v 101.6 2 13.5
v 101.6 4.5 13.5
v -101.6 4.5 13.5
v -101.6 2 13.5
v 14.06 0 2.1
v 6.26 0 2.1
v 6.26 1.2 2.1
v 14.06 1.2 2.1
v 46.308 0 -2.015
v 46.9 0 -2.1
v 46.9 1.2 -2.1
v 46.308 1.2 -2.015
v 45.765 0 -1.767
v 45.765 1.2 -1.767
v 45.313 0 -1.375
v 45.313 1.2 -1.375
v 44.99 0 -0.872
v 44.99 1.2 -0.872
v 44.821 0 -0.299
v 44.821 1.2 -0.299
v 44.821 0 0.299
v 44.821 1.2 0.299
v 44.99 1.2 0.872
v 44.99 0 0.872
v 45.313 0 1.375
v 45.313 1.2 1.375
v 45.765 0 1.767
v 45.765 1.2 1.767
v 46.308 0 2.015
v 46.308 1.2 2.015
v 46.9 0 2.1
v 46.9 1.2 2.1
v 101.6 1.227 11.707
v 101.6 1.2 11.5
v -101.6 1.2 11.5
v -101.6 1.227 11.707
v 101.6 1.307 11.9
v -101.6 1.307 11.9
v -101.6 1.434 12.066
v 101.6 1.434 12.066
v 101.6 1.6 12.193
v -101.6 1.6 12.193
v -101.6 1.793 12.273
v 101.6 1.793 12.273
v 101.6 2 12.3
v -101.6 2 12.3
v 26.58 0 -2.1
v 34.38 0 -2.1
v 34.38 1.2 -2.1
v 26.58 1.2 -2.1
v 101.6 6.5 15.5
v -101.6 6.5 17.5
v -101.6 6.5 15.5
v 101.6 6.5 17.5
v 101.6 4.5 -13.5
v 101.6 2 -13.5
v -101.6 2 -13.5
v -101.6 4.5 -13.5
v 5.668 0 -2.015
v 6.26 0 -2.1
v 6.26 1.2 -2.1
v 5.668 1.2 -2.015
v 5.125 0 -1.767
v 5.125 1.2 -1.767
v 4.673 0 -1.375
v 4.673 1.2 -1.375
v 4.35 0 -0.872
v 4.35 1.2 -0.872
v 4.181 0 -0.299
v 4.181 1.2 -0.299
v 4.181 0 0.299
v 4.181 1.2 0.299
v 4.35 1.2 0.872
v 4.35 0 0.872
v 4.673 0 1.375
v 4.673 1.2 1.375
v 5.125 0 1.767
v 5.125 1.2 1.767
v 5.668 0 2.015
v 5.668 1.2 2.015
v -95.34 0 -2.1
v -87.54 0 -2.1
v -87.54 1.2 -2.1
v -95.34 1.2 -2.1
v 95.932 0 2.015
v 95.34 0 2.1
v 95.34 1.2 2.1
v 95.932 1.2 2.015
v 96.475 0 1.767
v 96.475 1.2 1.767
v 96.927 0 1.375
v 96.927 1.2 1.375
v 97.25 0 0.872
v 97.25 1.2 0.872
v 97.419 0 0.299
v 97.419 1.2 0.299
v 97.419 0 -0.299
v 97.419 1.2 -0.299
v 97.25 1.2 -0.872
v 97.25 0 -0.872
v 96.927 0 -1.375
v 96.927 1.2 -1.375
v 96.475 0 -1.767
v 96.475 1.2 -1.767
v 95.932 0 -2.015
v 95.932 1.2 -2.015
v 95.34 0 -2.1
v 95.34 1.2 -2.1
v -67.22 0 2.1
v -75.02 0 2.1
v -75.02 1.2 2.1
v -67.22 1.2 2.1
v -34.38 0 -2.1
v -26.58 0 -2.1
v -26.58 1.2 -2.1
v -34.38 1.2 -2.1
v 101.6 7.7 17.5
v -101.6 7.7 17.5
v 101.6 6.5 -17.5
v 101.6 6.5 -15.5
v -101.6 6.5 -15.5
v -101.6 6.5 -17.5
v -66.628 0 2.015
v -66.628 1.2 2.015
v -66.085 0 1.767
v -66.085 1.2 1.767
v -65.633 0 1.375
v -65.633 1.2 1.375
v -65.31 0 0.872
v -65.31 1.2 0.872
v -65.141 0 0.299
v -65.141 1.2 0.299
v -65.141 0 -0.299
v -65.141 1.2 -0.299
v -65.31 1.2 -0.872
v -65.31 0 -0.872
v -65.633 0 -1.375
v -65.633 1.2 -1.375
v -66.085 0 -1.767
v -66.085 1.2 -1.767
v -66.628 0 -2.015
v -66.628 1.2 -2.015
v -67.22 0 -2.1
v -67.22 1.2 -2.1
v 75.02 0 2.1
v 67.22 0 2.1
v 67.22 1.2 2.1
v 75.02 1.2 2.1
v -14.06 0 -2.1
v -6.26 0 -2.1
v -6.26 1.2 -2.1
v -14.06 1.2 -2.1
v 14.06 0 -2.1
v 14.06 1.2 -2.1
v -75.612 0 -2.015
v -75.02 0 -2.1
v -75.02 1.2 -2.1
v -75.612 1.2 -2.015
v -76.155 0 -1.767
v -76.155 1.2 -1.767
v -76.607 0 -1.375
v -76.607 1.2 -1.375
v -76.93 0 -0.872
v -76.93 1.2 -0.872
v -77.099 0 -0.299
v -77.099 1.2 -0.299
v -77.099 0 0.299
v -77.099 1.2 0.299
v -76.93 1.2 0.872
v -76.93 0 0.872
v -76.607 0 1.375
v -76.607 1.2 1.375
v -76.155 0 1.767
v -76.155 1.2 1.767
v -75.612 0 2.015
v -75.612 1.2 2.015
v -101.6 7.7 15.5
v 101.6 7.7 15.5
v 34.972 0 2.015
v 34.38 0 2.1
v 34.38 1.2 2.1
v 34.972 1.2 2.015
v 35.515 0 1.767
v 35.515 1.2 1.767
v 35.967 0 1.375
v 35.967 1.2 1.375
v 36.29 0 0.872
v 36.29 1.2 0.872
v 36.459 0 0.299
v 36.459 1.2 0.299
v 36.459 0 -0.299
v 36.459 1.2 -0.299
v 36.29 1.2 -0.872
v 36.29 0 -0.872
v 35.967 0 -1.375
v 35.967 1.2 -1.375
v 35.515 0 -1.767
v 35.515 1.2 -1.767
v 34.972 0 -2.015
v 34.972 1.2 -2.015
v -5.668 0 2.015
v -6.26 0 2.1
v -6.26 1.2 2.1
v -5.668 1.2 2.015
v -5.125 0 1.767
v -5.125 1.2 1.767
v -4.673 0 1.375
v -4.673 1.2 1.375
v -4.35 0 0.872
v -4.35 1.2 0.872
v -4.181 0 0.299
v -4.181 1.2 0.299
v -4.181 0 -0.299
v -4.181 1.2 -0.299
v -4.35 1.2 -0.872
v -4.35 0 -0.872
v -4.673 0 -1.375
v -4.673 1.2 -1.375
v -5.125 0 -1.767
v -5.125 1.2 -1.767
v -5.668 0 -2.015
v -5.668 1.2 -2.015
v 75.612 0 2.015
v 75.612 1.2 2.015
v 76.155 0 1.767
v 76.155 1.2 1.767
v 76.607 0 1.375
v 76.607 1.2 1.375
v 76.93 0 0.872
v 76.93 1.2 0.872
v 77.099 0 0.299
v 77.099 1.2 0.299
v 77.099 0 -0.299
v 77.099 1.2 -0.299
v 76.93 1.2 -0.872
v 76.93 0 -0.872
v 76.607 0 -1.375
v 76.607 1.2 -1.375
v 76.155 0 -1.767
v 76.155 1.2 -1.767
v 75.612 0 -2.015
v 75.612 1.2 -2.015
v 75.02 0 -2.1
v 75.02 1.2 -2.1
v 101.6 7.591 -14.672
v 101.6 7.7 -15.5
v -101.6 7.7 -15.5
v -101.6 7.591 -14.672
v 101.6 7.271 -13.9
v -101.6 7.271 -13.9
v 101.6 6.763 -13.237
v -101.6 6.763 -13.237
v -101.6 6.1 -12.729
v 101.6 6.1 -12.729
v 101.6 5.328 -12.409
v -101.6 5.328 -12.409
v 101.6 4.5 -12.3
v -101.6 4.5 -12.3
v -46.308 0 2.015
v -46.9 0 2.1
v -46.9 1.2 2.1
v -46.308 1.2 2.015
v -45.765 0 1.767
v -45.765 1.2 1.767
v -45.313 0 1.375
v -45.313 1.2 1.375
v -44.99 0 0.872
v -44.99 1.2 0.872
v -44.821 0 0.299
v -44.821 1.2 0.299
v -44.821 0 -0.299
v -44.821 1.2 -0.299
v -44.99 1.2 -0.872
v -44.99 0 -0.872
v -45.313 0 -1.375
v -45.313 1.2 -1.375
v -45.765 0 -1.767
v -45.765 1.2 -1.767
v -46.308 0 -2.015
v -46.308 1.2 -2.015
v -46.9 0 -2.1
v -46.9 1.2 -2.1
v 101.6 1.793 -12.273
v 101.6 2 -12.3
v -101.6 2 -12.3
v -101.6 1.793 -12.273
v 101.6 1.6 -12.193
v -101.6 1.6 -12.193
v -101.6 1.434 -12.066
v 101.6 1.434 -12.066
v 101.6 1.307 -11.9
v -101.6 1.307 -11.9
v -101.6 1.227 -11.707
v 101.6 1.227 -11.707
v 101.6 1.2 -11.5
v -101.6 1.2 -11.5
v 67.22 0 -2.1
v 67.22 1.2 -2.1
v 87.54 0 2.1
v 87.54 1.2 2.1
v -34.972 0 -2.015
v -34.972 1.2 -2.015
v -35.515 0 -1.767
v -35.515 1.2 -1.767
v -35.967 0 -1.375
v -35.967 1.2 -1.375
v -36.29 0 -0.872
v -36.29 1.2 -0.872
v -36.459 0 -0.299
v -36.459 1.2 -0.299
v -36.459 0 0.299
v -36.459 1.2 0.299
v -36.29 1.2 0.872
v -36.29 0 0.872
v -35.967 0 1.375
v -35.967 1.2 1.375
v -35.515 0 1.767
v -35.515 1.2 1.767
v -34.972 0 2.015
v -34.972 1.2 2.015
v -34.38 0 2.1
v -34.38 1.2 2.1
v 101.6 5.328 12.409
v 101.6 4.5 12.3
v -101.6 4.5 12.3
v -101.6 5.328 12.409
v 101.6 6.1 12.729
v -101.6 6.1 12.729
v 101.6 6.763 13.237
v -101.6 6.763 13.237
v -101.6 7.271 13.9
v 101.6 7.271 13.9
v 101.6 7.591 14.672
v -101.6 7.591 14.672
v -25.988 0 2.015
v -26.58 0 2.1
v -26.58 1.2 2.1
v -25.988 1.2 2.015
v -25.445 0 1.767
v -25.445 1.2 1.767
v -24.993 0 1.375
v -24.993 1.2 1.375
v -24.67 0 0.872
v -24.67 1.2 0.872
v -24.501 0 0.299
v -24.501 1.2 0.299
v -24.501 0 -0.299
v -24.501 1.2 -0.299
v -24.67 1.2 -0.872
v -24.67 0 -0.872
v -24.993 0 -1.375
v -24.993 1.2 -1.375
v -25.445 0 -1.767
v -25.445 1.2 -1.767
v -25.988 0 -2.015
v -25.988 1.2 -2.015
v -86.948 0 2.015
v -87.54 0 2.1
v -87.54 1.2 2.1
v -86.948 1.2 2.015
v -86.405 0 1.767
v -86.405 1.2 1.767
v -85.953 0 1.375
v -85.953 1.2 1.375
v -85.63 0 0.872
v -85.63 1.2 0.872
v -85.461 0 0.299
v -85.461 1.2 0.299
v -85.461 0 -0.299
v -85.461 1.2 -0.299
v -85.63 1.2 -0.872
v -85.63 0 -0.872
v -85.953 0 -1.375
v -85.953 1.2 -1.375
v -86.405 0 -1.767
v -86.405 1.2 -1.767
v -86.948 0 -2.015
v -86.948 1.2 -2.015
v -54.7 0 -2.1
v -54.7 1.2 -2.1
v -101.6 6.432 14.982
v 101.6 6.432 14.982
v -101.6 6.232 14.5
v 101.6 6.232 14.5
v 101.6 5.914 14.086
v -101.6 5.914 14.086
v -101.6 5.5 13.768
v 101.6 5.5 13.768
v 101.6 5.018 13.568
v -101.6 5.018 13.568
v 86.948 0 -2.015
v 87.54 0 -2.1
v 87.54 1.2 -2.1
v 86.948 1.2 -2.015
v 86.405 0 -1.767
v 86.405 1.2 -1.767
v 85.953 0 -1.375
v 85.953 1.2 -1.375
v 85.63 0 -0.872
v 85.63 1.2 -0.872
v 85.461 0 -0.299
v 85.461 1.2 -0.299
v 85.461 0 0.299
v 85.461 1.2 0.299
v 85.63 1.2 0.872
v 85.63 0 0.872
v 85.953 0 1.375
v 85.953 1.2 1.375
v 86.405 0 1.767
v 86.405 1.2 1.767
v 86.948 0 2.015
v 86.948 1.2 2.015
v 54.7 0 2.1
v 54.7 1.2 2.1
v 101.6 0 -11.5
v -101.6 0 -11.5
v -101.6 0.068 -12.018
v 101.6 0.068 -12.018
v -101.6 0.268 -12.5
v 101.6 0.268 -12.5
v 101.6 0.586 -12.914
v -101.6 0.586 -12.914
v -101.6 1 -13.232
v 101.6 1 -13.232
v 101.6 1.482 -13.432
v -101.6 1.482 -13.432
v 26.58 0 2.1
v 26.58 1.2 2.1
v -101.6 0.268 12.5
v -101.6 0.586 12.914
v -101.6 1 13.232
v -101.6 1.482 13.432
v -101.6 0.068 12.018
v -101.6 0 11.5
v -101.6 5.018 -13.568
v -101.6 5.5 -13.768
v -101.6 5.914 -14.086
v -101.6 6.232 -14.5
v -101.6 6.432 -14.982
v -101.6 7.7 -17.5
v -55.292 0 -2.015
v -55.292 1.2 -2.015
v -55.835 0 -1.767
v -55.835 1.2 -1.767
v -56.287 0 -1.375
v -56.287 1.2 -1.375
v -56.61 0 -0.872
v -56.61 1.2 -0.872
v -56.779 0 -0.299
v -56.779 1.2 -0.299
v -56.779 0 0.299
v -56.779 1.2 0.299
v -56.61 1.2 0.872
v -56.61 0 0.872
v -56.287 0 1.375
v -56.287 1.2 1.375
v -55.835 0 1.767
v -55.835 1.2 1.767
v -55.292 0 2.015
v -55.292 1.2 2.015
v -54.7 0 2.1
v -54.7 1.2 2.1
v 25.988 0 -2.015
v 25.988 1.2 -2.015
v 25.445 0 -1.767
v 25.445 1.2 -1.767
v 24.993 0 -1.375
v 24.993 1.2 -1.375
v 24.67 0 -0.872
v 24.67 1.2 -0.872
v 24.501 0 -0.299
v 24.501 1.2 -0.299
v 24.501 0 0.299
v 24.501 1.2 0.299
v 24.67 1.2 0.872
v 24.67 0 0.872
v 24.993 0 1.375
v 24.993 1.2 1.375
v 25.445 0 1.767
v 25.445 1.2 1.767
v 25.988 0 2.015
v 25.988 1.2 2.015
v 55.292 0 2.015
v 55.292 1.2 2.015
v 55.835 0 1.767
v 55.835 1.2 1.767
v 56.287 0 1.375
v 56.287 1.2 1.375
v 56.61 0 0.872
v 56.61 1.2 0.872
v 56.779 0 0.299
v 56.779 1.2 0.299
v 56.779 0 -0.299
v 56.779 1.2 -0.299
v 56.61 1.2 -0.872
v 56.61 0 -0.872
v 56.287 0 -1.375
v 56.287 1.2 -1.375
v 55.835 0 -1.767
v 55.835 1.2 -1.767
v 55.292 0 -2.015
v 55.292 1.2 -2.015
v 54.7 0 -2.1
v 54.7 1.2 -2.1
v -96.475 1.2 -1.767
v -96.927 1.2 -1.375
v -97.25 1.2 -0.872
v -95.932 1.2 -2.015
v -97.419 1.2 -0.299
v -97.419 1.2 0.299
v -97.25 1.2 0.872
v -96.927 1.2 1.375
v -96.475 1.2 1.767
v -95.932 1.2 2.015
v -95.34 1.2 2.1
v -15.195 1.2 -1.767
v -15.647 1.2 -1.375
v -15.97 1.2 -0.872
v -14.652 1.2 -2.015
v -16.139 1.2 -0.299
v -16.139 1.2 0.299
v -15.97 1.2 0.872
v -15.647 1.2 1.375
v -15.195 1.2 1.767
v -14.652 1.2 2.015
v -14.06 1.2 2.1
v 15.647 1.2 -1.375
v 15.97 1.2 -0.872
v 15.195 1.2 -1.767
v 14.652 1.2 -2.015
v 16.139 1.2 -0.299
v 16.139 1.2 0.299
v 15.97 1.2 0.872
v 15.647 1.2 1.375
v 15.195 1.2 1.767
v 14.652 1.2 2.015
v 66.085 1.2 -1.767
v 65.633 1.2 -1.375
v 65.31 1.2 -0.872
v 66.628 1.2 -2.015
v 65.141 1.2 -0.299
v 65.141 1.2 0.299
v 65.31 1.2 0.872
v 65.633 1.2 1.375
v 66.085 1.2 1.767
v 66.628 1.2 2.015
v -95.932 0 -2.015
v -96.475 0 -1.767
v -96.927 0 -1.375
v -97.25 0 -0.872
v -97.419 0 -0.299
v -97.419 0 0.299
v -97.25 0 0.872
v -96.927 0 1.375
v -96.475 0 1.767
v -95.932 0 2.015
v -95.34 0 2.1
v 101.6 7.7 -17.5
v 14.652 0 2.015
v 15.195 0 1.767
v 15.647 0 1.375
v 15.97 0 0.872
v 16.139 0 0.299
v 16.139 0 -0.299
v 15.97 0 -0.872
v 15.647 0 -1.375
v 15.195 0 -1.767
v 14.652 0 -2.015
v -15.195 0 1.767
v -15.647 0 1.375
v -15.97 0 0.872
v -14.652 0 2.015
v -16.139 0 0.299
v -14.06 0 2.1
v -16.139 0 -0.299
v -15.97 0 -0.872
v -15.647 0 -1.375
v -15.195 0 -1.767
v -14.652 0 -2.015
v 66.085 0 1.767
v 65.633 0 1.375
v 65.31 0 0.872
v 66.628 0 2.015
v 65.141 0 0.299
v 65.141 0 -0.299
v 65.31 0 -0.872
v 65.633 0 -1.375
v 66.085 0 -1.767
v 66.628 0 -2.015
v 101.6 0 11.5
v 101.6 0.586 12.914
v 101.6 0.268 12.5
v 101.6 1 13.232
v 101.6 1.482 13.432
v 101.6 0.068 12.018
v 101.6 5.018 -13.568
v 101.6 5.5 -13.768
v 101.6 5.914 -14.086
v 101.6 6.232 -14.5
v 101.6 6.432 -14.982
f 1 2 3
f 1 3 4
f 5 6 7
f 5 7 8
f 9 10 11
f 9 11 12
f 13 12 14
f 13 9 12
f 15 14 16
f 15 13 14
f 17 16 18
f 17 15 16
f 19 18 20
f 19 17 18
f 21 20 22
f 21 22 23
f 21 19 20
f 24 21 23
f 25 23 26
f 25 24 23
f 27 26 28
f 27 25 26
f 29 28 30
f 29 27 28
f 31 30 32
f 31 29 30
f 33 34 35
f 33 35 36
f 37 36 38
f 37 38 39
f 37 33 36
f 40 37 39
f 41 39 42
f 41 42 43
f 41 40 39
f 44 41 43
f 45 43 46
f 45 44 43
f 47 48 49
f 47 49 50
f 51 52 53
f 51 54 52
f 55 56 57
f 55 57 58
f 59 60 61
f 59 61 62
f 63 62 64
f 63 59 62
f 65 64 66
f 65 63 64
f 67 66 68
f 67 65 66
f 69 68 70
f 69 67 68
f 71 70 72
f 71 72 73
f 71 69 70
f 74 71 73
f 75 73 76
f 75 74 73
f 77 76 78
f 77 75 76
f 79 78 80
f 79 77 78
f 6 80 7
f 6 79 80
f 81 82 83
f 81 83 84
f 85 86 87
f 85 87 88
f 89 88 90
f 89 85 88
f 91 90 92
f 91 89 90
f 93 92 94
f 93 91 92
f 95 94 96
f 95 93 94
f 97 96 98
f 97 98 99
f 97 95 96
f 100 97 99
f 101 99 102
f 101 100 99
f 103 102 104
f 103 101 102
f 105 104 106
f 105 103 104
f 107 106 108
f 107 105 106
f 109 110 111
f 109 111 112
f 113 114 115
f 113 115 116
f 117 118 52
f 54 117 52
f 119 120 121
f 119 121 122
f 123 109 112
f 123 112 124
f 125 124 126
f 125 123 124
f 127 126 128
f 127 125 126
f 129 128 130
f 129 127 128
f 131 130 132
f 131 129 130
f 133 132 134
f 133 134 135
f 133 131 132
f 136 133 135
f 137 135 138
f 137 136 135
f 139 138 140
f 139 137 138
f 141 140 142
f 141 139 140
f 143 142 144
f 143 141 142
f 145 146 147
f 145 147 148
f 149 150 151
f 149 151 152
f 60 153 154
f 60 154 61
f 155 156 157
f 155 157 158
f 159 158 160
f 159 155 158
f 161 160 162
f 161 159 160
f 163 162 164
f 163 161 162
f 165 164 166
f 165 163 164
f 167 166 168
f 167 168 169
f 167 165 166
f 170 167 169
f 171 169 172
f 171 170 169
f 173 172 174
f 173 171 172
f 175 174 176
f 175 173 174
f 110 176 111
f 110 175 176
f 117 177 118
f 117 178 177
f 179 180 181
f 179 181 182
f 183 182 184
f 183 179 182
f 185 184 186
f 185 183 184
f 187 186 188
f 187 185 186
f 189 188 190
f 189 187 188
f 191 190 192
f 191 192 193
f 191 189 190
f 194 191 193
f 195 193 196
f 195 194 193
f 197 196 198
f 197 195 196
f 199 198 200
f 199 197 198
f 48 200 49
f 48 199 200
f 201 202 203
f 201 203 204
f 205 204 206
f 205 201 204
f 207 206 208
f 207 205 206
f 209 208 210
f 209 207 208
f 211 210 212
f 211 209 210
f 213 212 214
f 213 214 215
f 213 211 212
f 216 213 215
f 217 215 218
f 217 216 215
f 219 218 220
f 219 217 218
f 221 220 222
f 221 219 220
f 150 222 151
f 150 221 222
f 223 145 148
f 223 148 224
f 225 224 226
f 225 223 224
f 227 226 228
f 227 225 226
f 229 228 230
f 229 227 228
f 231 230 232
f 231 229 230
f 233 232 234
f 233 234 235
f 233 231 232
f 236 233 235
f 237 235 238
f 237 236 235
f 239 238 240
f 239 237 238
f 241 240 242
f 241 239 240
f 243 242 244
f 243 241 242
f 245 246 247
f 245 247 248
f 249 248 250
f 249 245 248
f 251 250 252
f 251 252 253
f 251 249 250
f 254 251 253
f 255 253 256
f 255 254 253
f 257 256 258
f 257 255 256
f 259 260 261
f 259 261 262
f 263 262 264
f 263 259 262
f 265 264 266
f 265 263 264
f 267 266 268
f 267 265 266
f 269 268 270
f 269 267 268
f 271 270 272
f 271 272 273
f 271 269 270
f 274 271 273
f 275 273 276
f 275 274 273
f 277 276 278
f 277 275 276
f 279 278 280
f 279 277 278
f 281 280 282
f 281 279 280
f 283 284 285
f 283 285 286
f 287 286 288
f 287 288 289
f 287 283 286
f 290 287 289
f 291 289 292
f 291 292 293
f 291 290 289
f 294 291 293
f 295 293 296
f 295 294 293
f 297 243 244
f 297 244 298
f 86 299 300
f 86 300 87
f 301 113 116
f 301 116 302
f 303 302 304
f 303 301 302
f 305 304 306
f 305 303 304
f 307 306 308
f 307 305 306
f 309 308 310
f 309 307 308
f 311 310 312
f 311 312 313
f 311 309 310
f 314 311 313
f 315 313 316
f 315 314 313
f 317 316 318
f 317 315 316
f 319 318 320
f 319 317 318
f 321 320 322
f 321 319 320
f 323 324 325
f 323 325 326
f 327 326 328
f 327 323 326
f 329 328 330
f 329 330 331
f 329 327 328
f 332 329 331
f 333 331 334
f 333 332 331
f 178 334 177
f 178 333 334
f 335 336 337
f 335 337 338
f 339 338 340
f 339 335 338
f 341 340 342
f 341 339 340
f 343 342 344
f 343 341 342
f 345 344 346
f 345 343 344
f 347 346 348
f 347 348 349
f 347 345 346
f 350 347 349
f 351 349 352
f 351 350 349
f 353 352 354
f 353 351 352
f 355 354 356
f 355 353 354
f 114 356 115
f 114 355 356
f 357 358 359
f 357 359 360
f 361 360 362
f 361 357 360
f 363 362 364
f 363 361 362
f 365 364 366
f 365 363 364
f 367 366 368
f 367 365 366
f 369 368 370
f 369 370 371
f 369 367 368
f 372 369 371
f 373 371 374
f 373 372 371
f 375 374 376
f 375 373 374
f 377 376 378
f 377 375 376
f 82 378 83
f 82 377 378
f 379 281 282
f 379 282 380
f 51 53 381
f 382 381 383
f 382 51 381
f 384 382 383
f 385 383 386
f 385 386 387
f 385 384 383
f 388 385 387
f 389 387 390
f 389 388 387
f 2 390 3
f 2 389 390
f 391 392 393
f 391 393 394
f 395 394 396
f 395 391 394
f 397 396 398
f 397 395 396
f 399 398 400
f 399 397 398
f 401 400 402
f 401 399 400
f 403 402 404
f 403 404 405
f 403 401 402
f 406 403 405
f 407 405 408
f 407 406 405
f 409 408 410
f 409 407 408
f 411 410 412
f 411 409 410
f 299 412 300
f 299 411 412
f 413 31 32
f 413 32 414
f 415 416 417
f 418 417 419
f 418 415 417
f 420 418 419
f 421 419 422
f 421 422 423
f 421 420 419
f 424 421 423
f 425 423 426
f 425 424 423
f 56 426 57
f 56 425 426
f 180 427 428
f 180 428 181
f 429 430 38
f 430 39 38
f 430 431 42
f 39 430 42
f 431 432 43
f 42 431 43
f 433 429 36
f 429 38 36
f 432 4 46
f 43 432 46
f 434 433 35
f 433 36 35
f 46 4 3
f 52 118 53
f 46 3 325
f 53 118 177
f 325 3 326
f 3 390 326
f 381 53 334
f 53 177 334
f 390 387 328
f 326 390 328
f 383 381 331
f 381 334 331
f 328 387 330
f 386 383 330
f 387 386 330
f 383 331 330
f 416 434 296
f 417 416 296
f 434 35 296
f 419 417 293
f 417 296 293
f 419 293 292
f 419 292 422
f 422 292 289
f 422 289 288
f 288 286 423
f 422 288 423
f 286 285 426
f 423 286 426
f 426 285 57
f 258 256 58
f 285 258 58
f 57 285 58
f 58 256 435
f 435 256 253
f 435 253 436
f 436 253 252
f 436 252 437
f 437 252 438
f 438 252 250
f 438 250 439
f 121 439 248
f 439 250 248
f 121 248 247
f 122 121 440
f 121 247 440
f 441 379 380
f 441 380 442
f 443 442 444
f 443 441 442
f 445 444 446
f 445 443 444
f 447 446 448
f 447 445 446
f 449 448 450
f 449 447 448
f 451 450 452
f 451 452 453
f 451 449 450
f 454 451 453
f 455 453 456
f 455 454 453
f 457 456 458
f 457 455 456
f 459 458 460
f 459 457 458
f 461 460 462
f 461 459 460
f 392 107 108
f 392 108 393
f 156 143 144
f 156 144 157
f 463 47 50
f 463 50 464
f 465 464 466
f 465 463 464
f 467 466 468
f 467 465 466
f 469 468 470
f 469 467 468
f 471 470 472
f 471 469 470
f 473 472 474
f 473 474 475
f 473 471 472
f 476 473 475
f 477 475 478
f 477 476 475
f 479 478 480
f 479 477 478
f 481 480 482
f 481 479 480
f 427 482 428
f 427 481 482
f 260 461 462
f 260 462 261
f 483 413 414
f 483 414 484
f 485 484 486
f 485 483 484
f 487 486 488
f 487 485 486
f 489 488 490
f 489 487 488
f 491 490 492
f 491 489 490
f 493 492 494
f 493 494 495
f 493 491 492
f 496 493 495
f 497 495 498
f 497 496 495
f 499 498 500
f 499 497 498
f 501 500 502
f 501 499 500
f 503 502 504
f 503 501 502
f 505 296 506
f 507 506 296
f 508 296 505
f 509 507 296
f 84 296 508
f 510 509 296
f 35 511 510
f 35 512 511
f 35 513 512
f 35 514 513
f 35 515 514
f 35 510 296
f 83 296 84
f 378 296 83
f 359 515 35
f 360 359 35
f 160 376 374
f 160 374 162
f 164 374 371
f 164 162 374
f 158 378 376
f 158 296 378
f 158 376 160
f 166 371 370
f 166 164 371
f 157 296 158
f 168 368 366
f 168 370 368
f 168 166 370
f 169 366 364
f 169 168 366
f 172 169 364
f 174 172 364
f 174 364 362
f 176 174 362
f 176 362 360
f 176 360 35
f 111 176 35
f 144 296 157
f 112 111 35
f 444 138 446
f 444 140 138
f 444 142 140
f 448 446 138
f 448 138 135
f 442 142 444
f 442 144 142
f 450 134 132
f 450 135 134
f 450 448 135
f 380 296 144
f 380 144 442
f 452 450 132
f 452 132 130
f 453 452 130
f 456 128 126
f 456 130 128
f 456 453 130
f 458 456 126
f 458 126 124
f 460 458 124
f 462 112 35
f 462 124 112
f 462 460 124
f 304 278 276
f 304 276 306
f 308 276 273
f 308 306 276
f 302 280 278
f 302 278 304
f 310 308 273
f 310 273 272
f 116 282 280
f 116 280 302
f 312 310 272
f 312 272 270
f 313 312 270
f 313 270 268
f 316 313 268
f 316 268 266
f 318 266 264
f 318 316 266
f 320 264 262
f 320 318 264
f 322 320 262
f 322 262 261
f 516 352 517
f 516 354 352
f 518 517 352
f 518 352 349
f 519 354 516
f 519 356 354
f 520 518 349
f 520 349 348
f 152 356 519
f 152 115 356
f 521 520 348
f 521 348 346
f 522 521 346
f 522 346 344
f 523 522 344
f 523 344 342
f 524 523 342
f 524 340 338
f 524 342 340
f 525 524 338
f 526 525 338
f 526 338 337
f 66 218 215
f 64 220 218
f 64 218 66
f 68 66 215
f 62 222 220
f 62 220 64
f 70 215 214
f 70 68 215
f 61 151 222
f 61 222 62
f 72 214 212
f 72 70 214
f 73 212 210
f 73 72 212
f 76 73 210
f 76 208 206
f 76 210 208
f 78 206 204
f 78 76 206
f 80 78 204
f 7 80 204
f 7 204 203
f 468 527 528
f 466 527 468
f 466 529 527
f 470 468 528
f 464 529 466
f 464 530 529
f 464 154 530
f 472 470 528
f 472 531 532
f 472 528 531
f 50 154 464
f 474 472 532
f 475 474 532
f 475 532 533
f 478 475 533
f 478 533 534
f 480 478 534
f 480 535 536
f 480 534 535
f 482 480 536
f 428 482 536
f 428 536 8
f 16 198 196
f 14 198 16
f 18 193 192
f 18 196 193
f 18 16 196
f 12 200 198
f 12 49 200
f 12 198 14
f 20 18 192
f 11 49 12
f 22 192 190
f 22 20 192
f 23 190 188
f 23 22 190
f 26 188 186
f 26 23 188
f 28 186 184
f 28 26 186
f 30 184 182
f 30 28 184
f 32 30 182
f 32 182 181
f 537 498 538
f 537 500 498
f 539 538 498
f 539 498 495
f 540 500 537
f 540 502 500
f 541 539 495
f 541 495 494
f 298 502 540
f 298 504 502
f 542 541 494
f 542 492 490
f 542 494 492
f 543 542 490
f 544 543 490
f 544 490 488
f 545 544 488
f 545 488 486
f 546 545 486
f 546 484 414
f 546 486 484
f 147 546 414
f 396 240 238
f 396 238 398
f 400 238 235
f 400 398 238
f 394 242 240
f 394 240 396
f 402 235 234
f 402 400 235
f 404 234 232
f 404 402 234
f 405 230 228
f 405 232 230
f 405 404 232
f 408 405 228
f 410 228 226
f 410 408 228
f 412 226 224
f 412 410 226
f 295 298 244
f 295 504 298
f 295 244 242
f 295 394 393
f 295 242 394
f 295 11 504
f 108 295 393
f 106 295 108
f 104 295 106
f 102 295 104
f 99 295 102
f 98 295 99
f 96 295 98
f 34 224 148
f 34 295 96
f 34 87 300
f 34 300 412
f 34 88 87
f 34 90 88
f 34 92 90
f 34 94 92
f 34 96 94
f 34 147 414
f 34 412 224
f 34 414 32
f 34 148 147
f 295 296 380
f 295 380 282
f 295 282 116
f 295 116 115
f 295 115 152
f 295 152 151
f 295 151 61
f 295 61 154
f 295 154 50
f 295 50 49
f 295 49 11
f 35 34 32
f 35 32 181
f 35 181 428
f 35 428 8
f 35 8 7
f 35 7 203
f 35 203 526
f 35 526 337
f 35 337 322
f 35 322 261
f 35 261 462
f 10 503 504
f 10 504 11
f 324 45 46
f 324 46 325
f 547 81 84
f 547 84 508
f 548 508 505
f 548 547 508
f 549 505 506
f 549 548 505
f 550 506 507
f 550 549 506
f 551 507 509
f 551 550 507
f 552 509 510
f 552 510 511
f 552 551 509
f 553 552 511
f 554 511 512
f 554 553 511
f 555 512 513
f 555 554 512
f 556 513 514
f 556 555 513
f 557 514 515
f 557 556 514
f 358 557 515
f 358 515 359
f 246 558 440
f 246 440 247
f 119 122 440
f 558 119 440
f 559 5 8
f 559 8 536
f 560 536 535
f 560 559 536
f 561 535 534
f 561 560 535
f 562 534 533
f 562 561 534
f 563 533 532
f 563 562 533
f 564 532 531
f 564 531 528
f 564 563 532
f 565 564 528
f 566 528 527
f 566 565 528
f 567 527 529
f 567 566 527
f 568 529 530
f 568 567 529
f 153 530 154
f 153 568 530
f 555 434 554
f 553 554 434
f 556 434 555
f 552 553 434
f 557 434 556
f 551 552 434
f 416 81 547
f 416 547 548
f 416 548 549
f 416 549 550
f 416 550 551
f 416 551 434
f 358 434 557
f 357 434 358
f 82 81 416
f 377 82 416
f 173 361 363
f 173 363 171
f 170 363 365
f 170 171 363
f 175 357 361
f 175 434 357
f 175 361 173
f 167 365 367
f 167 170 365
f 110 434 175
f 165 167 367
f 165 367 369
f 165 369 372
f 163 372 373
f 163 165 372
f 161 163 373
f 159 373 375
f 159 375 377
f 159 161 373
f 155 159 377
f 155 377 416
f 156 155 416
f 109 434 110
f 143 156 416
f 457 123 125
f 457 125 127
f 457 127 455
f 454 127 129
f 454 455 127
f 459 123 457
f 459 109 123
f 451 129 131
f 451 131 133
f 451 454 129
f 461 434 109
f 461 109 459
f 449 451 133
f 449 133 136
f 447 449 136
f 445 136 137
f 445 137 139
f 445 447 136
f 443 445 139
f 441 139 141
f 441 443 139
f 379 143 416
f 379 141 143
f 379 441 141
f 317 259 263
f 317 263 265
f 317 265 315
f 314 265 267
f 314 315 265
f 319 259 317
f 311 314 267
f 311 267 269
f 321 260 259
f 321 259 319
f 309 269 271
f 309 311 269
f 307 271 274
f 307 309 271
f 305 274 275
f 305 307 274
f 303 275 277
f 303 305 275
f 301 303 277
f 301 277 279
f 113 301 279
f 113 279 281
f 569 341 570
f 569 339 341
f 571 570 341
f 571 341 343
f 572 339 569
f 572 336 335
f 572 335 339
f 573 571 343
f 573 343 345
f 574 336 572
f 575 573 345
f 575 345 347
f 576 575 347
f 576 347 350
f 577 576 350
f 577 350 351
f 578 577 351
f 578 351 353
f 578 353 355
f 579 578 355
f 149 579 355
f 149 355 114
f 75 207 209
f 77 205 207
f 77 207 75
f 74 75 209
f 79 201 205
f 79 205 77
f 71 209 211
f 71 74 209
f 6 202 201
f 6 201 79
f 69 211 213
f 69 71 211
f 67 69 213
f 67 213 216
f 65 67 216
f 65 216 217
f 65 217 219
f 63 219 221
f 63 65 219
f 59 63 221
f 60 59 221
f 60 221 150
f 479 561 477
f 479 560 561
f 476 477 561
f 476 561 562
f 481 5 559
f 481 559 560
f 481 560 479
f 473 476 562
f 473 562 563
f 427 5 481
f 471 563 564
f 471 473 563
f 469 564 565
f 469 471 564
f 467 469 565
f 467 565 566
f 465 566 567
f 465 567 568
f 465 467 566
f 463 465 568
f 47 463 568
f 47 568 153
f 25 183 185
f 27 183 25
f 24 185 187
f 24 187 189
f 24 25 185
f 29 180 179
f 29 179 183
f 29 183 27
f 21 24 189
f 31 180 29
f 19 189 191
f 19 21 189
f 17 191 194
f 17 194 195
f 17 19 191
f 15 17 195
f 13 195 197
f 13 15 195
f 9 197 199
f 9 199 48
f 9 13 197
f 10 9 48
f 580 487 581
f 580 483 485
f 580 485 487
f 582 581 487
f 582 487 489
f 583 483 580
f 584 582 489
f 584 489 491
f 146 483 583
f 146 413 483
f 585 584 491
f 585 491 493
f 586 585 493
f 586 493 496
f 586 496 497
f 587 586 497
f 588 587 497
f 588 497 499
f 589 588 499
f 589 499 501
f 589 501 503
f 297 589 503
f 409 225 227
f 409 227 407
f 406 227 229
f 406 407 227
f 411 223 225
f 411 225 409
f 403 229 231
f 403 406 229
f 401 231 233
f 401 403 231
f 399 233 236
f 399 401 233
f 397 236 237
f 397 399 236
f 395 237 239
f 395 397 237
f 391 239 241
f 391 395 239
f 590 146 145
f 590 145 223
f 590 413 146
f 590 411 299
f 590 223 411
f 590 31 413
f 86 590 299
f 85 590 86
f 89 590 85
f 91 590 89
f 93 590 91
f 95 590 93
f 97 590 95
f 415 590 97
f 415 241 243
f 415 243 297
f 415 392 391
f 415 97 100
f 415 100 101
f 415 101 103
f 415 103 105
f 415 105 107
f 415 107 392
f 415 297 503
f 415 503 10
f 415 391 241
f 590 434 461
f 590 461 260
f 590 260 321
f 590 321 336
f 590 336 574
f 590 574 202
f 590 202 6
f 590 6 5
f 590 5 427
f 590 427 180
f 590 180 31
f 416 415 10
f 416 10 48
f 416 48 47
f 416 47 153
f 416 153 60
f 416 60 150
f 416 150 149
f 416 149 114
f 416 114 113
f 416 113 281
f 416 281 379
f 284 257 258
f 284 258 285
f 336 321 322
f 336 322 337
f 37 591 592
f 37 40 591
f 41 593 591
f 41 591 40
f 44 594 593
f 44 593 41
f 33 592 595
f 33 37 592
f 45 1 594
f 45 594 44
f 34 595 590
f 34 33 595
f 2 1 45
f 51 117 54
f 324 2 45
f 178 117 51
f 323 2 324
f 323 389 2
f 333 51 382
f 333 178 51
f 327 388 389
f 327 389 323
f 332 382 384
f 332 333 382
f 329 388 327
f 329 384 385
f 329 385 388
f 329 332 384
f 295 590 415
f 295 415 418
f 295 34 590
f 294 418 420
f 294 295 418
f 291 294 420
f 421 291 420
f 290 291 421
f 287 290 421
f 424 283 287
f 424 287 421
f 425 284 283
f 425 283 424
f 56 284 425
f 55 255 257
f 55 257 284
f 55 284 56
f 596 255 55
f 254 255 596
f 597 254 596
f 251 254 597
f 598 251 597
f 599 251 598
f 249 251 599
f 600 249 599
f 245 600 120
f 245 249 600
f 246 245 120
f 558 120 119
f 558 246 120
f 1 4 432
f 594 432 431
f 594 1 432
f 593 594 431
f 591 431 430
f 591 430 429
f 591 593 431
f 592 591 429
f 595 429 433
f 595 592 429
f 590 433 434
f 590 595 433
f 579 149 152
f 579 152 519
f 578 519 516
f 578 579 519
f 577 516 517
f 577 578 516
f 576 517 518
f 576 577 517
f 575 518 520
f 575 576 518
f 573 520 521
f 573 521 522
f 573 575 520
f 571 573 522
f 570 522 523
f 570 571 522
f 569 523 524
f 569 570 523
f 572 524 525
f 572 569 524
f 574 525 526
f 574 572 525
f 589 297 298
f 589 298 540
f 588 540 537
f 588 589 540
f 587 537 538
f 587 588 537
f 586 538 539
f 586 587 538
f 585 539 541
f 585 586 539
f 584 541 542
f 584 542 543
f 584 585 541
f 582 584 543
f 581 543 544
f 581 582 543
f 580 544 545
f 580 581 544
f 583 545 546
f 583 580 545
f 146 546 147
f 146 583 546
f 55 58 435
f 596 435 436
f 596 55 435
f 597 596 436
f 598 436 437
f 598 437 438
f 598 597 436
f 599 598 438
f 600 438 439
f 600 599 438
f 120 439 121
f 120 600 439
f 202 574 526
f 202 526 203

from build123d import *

# Parameters (mm, degrees)
EXTRUDE_THIN1_DEPTH = 101.6
CUT_EXTRUDE1_DEPTH  = 1.2
LPATTERN1_COUNT     = 10
LPATTERN1_PITCH     = 20.32


with BuildPart() as part:
    # Sketch1 → Extrude-Thin1 (new body, symmetric)
    with BuildSketch(Plane(origin=(0, 0, 0), x_dir=(0, 0, -1), z_dir=(1, 0, 0))):
        with BuildLine():
            Line((-17.5, 6.5), (-15.5, 6.5))
            ThreePointArc((-15.5, 6.5), (-14.085786438, 5.914213562), (-13.5, 4.5))
            Line((-13.5, 4.5), (-13.5, 2))
            ThreePointArc((-13.5, 2), (-12.914213562, 0.585786438), (-11.5, 0))
            Line((-11.5, 0), (11.5, 0))
            ThreePointArc((11.5, 0), (12.914213562, 0.585786438), (13.5, 2))
            Line((13.5, 2), (13.5, 4.5))
            ThreePointArc((13.5, 4.5), (14.085786438, 5.914213562), (15.5, 6.5))
            Line((15.5, 6.5), (17.5, 6.5))
            Line((17.5, 6.5), (17.5, 7.7))
            Line((17.5, 7.7), (15.5, 7.7))
            ThreePointArc((15.5, 7.7), (13.2372583, 6.7627417), (12.3, 4.5))
            Line((12.3, 4.5), (12.3, 2))
            ThreePointArc((12.3, 2), (12.065685425, 1.434314575), (11.5, 1.2))
            Line((11.5, 1.2), (-11.5, 1.2))
            ThreePointArc((-11.5, 1.2), (-12.065685425, 1.434314575), (-12.3, 2))
            Line((-12.3, 2), (-12.3, 4.5))
            ThreePointArc((-12.3, 4.5), (-13.2372583, 6.7627417), (-15.5, 7.7))
            Line((-15.5, 7.7), (-17.5, 7.7))
            Line((-17.5, 7.7), (-17.5, 6.5))
        make_face()
    extrude(amount=EXTRUDE_THIN1_DEPTH, both=True)

    # Sketch2 → Cut-Extrude1 (cut)
    with BuildSketch(Plane.XZ):
        with BuildLine():
            Line((87.54, 2.1), (95.34, 2.1))
            ThreePointArc((95.34, 2.1), (97.44, 0), (95.34, -2.1))
            Line((95.34, -2.1), (87.54, -2.1))
            ThreePointArc((87.54, -2.1), (85.44, 0), (87.54, 2.1))
        make_face()
    cut_extrude1 = extrude(amount=-CUT_EXTRUDE1_DEPTH, mode=Mode.SUBTRACT)

    # LPattern1: Cut-Extrude1 ×10
    with Locations(*[(-i * LPATTERN1_PITCH, 0, 0) for i in range(1, LPATTERN1_COUNT)]):
        add(cut_extrude1, mode=Mode.SUBTRACT)


solid = part.part
